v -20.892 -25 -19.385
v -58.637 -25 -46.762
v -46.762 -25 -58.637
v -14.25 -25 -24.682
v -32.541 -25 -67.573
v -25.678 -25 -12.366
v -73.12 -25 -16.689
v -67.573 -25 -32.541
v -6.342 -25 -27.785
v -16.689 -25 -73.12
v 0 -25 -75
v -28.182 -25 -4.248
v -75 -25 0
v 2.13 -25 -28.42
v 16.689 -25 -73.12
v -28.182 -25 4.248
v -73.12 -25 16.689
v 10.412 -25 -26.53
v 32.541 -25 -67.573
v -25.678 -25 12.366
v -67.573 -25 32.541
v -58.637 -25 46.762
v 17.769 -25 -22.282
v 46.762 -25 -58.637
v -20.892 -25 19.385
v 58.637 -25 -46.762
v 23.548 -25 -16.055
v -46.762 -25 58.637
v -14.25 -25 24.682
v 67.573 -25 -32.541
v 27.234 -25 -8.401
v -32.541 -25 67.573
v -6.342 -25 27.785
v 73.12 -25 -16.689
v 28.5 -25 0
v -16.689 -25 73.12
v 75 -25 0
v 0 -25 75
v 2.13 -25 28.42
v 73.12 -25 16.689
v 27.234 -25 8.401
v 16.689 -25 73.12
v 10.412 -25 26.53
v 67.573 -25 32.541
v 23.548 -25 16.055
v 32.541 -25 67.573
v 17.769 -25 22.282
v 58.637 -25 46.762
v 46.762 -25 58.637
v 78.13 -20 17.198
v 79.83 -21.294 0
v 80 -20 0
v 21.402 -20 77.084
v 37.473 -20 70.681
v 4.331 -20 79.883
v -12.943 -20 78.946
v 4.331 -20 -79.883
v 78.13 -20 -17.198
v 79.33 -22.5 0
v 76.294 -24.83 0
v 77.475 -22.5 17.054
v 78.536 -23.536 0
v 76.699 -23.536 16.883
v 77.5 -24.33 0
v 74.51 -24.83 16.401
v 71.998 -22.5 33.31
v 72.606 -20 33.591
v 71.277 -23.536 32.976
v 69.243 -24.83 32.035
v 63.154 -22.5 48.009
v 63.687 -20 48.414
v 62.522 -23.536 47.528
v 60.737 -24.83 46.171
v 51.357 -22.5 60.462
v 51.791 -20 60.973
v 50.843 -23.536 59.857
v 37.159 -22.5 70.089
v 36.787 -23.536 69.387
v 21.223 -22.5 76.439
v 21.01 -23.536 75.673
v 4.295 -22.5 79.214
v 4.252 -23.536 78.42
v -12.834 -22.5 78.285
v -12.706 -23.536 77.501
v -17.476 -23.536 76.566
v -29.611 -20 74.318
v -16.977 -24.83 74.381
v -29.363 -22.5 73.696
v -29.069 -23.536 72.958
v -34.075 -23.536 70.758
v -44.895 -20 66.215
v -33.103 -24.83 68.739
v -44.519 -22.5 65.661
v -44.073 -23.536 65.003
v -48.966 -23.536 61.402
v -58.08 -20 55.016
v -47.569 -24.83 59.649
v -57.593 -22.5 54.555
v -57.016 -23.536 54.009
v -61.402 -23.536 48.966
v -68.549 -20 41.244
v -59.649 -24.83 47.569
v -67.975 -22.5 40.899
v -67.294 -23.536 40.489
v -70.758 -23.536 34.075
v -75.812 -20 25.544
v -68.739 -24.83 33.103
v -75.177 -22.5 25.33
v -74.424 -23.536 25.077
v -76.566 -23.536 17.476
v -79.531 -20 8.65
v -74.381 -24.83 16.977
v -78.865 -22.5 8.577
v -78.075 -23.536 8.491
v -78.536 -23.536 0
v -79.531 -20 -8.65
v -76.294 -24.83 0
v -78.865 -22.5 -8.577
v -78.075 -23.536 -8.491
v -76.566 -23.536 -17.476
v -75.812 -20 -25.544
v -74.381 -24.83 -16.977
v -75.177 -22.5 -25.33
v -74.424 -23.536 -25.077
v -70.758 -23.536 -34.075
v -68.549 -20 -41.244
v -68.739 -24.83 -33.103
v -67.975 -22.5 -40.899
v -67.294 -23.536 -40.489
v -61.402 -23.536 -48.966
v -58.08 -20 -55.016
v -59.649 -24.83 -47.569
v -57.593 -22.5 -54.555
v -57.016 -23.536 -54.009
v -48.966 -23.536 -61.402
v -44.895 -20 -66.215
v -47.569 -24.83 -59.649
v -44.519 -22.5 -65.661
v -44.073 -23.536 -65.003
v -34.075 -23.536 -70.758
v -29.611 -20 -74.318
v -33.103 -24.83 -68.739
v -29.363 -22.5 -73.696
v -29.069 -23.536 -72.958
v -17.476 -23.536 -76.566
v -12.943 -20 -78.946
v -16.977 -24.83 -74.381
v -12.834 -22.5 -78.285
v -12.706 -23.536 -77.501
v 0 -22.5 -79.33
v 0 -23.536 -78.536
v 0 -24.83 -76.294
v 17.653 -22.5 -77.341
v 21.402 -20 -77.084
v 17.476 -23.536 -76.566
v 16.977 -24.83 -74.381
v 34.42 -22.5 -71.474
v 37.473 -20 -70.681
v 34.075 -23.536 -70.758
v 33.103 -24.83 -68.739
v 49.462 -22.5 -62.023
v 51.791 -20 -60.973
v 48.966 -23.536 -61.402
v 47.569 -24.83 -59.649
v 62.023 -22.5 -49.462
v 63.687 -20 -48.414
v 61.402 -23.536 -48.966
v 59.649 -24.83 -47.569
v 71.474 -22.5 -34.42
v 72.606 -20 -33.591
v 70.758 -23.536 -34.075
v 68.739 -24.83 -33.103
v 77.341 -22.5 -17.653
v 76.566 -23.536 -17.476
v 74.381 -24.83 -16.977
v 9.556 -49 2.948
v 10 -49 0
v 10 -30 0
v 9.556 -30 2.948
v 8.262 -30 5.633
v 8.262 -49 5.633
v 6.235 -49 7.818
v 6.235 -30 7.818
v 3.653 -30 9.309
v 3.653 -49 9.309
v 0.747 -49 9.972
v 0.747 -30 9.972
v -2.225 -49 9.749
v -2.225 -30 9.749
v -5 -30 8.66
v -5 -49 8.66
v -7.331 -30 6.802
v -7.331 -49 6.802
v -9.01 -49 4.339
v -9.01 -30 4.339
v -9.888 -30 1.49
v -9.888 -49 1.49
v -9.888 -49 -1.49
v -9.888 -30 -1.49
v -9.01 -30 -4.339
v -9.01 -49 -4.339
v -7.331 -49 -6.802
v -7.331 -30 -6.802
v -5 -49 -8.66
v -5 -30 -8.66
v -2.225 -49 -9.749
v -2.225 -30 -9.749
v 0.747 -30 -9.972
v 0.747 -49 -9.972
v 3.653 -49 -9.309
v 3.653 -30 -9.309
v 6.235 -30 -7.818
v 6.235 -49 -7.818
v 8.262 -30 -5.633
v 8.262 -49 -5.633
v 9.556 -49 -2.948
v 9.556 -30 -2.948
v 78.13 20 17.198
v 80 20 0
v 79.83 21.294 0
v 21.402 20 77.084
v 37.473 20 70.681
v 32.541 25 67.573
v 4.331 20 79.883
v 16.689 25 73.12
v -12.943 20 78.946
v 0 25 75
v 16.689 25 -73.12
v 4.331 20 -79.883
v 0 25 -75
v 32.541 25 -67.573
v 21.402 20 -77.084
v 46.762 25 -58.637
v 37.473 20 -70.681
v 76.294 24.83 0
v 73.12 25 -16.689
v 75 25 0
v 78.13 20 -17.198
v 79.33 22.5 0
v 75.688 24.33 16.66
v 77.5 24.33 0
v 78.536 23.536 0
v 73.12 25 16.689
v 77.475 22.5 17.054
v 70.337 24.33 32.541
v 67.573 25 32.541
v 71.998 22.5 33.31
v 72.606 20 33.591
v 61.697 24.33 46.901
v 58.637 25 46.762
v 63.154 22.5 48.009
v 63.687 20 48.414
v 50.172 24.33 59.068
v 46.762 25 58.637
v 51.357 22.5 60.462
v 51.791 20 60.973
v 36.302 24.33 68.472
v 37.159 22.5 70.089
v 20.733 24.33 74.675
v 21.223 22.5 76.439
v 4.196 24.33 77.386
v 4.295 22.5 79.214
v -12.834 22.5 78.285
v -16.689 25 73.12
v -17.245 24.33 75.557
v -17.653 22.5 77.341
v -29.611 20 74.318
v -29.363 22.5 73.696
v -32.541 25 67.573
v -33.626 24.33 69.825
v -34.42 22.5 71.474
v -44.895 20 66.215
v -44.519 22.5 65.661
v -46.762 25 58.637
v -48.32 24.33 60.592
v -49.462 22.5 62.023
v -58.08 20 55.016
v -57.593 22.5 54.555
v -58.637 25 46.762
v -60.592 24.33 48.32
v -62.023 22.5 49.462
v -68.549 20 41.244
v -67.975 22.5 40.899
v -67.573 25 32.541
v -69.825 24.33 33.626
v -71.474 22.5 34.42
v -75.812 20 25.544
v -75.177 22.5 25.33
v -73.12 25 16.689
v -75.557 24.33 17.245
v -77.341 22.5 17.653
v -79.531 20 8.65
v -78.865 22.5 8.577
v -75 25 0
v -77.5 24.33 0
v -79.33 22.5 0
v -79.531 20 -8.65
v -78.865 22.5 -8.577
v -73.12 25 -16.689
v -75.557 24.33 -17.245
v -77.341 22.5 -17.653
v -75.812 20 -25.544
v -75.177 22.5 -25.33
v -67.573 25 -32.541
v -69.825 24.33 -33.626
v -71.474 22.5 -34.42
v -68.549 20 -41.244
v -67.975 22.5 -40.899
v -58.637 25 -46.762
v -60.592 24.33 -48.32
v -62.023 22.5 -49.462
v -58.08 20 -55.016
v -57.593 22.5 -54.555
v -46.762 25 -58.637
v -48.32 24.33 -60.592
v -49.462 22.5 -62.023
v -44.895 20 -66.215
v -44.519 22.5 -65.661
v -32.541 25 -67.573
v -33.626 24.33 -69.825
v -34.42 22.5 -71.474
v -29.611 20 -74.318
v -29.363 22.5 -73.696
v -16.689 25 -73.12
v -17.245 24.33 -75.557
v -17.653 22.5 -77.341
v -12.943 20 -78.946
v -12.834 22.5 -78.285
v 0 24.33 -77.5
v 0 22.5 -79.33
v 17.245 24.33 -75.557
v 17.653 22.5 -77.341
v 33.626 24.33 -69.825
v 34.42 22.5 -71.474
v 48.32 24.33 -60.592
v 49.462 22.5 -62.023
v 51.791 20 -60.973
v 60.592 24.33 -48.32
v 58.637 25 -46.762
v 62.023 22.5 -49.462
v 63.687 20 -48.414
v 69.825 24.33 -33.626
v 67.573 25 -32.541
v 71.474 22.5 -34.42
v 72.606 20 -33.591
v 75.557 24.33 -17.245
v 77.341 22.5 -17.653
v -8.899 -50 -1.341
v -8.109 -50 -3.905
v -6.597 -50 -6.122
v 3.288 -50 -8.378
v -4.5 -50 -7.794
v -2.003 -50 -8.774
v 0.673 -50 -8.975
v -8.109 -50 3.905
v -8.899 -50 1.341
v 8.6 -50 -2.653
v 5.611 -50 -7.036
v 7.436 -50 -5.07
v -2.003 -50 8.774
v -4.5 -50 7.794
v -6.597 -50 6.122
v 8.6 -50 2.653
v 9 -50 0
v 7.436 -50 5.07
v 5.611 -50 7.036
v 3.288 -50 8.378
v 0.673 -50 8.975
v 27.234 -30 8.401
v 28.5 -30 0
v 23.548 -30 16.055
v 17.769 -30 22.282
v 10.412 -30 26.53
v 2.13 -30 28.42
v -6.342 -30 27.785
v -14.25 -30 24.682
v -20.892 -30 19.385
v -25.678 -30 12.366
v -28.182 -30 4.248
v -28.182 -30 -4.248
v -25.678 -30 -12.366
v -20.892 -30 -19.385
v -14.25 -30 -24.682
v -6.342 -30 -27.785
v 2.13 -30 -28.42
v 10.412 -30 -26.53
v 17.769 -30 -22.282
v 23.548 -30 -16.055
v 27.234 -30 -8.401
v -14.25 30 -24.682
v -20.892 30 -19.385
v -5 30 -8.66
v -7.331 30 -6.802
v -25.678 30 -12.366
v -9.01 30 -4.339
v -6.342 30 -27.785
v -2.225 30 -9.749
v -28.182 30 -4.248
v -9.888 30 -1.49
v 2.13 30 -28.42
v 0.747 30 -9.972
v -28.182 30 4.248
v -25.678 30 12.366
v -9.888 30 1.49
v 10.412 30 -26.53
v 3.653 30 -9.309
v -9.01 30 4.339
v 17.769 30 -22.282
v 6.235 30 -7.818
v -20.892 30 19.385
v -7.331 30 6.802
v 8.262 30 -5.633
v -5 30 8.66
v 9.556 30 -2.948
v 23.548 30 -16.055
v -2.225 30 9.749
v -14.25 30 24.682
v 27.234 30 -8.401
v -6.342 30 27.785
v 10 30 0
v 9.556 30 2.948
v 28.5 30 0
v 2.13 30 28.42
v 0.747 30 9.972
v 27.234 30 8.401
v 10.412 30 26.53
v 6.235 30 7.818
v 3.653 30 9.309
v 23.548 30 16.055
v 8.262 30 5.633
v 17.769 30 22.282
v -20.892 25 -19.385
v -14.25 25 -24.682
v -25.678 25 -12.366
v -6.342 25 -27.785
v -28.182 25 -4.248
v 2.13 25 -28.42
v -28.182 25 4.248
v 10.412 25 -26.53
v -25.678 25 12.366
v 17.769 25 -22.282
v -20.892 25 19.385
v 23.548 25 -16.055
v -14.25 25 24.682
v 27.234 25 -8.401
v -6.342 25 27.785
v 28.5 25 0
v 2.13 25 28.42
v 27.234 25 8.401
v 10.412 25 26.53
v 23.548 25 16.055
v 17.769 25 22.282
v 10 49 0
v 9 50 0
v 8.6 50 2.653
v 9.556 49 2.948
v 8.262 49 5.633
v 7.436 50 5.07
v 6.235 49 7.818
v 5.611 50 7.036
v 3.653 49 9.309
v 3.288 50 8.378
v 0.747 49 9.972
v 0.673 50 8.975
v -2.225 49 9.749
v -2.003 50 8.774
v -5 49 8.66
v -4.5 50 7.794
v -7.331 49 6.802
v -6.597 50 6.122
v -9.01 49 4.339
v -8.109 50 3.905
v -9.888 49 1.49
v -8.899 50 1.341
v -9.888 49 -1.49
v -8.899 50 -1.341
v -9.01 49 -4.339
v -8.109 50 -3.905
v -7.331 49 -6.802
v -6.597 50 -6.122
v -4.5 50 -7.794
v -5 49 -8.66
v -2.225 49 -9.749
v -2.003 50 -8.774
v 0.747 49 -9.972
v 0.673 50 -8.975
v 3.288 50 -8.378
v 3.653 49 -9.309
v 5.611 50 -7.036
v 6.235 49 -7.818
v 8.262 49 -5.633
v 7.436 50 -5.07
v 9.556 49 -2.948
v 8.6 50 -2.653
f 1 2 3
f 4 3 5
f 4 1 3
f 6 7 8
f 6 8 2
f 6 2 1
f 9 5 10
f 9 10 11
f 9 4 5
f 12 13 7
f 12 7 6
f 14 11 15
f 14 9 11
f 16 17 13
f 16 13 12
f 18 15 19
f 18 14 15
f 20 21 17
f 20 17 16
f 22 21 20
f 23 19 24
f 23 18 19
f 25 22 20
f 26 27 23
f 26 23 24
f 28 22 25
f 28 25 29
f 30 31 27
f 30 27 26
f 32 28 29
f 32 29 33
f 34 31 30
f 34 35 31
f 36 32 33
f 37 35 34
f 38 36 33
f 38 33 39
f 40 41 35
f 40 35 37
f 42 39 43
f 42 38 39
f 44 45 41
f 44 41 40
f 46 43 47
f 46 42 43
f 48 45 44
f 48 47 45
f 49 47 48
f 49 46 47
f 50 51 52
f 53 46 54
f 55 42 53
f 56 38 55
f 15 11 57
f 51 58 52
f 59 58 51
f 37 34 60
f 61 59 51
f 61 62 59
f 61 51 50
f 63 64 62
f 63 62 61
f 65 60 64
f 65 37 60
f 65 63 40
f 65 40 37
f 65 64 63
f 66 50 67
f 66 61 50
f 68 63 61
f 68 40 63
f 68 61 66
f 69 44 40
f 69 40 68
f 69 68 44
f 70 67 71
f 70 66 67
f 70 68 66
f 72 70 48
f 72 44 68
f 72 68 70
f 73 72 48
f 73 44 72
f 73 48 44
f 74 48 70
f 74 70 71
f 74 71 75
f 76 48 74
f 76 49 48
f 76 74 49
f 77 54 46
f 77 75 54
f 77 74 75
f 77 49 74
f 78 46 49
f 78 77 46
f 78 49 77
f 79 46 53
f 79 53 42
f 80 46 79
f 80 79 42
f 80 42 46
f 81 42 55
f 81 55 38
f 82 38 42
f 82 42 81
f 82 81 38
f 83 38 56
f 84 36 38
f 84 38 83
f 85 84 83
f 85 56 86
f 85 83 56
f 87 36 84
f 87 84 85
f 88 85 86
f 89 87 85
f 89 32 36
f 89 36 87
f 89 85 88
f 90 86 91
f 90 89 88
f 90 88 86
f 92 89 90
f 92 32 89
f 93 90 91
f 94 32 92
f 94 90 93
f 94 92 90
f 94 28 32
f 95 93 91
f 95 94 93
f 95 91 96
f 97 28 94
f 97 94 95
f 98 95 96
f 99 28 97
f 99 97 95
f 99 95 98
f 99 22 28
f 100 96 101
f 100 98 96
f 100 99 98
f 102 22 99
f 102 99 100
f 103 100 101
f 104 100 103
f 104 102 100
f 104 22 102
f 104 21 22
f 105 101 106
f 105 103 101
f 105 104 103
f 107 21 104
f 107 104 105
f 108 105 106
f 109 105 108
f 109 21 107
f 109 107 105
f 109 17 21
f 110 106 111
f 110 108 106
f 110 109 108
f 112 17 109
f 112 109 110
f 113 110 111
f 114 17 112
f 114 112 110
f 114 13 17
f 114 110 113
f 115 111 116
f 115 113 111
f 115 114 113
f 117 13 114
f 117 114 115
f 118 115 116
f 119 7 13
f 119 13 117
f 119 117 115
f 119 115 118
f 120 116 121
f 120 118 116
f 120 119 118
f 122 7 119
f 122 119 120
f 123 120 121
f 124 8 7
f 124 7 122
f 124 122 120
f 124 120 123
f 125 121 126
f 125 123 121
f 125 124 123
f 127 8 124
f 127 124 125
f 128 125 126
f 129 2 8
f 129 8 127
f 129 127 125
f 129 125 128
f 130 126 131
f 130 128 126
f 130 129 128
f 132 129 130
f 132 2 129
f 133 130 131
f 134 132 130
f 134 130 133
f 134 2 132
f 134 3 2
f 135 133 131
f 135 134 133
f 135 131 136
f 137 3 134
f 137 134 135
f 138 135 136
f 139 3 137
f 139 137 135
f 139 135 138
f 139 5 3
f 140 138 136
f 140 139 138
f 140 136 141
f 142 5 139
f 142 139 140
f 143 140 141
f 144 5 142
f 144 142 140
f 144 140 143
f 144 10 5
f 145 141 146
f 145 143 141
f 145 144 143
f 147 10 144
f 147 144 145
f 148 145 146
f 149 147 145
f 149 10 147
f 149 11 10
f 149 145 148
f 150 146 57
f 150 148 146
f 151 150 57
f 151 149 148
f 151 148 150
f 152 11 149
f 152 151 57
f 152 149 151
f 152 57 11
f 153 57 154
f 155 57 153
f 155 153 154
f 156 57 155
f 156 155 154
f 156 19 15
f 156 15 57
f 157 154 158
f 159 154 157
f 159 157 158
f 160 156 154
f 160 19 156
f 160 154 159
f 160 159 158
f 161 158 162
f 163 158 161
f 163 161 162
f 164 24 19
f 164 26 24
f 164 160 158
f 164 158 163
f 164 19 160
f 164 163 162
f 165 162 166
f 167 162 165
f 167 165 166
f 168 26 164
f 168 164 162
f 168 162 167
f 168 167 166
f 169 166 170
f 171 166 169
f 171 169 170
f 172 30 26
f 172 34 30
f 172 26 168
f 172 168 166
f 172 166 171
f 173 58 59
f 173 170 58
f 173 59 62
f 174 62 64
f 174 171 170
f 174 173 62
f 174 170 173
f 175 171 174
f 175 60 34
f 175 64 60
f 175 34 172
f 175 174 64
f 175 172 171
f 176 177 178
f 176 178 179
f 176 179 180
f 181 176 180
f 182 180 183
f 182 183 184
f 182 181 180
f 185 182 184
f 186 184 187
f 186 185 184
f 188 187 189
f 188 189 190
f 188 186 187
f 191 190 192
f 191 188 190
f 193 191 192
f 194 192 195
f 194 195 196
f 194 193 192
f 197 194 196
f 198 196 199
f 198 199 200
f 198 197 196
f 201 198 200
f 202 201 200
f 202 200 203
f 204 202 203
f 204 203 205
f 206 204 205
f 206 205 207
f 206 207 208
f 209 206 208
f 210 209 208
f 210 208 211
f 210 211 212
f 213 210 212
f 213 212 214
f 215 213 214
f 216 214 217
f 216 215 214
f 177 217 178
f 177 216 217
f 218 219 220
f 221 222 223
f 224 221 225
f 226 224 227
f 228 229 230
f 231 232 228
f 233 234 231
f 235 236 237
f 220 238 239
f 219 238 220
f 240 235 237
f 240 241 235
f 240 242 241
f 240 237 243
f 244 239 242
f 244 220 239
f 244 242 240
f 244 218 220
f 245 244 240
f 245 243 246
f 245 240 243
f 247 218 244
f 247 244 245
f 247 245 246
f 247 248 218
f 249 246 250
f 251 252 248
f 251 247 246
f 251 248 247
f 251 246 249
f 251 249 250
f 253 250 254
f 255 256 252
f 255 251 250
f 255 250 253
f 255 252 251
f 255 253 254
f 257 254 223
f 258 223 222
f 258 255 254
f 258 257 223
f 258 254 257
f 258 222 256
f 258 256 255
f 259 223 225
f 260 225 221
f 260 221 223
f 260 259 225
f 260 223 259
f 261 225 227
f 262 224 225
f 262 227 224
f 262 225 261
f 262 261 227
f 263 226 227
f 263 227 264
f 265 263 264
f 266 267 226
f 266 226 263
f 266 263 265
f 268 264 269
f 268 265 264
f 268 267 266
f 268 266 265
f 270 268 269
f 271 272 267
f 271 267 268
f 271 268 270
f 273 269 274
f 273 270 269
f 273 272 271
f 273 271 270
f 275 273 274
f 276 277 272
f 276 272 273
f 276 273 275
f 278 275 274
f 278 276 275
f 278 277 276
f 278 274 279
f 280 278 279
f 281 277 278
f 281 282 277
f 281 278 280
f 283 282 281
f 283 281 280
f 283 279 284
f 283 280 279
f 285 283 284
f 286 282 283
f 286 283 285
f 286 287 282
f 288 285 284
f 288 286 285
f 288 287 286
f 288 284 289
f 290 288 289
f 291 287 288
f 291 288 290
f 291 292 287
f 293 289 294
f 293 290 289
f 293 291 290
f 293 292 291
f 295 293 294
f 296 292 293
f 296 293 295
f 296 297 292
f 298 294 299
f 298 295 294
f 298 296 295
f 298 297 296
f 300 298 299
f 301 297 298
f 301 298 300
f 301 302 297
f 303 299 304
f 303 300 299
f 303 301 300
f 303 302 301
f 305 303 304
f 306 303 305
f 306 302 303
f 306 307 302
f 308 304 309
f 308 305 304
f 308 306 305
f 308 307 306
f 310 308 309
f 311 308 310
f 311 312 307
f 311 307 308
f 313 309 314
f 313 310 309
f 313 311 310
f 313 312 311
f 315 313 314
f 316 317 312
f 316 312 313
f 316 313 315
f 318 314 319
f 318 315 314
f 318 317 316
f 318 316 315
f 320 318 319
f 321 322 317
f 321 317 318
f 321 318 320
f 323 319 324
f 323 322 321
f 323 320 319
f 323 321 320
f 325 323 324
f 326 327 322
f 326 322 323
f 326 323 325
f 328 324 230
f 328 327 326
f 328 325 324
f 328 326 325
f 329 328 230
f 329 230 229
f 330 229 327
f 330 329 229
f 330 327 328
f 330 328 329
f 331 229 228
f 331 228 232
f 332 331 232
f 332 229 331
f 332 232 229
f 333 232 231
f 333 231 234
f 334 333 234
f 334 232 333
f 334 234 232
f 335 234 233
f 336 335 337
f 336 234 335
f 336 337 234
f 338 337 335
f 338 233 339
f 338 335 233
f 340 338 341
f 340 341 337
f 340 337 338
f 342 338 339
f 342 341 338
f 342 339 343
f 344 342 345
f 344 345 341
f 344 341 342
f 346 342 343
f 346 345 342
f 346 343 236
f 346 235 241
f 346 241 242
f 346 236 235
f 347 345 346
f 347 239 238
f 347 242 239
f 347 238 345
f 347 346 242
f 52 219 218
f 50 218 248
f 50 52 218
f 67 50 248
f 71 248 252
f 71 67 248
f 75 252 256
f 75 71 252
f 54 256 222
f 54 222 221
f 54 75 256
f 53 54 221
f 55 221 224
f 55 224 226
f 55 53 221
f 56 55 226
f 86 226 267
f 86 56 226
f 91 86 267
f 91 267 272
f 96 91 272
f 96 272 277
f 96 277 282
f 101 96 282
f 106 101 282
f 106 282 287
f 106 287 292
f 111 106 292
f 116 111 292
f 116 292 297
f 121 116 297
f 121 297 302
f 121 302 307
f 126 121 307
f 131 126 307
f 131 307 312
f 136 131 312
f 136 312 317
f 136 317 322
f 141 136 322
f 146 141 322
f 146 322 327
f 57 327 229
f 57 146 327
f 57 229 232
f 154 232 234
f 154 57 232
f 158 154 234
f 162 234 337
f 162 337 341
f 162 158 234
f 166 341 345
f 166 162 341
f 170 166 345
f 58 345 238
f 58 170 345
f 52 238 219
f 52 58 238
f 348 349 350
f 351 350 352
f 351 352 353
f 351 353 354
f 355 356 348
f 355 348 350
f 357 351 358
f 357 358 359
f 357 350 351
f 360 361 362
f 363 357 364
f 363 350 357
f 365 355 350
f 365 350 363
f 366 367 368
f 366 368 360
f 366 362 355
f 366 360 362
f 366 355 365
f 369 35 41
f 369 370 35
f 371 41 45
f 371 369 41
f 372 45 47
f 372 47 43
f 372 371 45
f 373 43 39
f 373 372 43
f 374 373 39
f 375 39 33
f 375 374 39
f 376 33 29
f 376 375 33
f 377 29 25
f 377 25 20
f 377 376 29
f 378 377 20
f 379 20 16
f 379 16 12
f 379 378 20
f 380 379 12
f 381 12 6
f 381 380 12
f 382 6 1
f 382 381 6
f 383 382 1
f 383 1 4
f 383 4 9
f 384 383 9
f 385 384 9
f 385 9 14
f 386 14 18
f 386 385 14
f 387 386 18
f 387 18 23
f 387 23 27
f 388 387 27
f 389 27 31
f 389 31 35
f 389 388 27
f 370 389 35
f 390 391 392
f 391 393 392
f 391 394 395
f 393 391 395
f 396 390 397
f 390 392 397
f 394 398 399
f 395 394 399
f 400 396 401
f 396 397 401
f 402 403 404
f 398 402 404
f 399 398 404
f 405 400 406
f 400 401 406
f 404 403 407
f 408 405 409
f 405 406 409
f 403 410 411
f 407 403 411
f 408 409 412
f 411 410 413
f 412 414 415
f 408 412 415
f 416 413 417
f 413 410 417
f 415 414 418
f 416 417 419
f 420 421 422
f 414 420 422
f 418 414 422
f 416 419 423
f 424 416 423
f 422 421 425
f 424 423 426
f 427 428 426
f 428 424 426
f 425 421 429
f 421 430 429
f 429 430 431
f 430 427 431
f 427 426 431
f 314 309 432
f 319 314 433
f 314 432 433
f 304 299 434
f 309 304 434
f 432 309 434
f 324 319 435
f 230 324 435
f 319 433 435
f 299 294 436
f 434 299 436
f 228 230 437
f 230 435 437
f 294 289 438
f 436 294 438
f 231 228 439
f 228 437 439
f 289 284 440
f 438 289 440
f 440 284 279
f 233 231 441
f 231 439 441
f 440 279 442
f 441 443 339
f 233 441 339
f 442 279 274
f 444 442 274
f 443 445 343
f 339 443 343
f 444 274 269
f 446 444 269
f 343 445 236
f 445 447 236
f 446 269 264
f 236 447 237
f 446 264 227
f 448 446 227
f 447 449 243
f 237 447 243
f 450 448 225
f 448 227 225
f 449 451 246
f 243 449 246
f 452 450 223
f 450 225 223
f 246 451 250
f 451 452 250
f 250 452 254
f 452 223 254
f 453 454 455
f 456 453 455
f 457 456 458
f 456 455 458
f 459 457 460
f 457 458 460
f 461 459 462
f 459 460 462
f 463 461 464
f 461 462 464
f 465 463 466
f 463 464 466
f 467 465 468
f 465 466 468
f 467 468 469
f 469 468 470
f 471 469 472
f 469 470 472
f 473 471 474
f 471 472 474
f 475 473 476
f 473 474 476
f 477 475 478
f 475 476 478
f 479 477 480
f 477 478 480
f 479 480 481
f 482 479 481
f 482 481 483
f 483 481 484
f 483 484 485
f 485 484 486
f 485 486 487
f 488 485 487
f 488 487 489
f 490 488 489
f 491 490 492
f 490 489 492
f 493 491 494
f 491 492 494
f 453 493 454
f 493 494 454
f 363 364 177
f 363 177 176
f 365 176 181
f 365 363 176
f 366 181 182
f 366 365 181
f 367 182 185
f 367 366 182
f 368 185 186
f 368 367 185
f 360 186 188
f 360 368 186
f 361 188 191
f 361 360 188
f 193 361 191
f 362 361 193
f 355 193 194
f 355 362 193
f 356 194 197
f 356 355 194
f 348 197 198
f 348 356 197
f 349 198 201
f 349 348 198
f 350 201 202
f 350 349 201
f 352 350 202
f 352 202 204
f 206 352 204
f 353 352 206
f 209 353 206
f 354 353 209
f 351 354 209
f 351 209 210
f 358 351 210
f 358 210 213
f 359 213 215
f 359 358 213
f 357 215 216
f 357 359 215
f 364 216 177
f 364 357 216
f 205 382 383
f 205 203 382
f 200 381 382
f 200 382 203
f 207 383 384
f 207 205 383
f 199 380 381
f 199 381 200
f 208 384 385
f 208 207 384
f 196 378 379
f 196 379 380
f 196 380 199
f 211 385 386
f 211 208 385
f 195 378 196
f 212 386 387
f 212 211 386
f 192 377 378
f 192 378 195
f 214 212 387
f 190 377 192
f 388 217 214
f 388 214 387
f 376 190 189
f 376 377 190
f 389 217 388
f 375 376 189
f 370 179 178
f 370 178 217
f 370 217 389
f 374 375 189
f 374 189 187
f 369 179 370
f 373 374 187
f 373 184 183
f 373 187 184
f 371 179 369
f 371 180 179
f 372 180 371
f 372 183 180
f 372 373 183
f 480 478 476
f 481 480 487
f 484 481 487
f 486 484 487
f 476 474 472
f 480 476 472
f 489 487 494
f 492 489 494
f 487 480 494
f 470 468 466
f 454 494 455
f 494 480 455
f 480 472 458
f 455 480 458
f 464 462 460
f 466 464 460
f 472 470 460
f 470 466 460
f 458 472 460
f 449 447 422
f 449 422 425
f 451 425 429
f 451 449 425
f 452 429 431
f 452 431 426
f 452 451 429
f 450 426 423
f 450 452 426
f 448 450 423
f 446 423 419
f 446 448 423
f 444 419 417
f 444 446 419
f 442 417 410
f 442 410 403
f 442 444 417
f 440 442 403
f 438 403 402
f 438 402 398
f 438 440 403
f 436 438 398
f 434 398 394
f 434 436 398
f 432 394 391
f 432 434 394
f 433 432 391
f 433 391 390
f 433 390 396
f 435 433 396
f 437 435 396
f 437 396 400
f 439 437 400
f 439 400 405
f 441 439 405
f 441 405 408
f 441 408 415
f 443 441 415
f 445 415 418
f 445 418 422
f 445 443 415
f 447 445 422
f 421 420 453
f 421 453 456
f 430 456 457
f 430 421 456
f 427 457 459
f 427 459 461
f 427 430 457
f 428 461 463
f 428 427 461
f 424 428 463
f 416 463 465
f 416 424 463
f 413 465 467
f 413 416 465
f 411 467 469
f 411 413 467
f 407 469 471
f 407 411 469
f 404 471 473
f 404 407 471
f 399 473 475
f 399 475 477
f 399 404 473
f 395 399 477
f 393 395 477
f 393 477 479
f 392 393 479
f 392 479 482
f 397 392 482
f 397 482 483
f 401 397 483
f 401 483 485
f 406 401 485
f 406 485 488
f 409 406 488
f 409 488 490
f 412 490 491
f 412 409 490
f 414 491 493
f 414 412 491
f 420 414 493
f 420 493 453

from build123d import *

# Parameters (mm, degrees)
F0_R     = 80
F0_R_2   = 75
F0_R_3   = 28.5
F1_DEPTH = 25
F0_R_4   = 10
F2_DEPTH = 30
F3_DEPTH = 50
F4_R     = 5
F5_SIZE  = 1


with BuildPart() as f1:
    # F0 (on Front) → F1 (new body, symmetric)
    with BuildSketch(Plane.XZ):
        Circle(F0_R)
        Circle(F0_R_2, mode=Mode.SUBTRACT)
        Circle(F0_R_2)
        Circle(F0_R_3, mode=Mode.SUBTRACT)
    extrude(amount=F1_DEPTH, both=True)

    # F0 (on Front) → F2 (join, symmetric)
    with BuildSketch(Plane.XZ):
        Circle(F0_R_3)
        Circle(F0_R_4, mode=Mode.SUBTRACT)
    extrude(amount=F2_DEPTH, both=True)

    # F0 (on Front) → F3 (join, symmetric)
    with BuildSketch(Plane.XZ):
        Circle(F0_R_4)
    extrude(amount=F3_DEPTH, both=True)

    # F4
    f4_edges = [f1.edges().sort_by_distance(p)[0] for p in [
        (-80, -25, 0),
        (-80, 25, 0),
    ]]
    fillet(f4_edges, radius=F4_R)

    # F5
    f5_edges = [f1.edges().sort_by_distance(p)[0] for p in [
        (-10, -50, 0),
        (-10, 50, 0),
    ]]
    chamfer(f5_edges, length=F5_SIZE)


solid = f1.part
